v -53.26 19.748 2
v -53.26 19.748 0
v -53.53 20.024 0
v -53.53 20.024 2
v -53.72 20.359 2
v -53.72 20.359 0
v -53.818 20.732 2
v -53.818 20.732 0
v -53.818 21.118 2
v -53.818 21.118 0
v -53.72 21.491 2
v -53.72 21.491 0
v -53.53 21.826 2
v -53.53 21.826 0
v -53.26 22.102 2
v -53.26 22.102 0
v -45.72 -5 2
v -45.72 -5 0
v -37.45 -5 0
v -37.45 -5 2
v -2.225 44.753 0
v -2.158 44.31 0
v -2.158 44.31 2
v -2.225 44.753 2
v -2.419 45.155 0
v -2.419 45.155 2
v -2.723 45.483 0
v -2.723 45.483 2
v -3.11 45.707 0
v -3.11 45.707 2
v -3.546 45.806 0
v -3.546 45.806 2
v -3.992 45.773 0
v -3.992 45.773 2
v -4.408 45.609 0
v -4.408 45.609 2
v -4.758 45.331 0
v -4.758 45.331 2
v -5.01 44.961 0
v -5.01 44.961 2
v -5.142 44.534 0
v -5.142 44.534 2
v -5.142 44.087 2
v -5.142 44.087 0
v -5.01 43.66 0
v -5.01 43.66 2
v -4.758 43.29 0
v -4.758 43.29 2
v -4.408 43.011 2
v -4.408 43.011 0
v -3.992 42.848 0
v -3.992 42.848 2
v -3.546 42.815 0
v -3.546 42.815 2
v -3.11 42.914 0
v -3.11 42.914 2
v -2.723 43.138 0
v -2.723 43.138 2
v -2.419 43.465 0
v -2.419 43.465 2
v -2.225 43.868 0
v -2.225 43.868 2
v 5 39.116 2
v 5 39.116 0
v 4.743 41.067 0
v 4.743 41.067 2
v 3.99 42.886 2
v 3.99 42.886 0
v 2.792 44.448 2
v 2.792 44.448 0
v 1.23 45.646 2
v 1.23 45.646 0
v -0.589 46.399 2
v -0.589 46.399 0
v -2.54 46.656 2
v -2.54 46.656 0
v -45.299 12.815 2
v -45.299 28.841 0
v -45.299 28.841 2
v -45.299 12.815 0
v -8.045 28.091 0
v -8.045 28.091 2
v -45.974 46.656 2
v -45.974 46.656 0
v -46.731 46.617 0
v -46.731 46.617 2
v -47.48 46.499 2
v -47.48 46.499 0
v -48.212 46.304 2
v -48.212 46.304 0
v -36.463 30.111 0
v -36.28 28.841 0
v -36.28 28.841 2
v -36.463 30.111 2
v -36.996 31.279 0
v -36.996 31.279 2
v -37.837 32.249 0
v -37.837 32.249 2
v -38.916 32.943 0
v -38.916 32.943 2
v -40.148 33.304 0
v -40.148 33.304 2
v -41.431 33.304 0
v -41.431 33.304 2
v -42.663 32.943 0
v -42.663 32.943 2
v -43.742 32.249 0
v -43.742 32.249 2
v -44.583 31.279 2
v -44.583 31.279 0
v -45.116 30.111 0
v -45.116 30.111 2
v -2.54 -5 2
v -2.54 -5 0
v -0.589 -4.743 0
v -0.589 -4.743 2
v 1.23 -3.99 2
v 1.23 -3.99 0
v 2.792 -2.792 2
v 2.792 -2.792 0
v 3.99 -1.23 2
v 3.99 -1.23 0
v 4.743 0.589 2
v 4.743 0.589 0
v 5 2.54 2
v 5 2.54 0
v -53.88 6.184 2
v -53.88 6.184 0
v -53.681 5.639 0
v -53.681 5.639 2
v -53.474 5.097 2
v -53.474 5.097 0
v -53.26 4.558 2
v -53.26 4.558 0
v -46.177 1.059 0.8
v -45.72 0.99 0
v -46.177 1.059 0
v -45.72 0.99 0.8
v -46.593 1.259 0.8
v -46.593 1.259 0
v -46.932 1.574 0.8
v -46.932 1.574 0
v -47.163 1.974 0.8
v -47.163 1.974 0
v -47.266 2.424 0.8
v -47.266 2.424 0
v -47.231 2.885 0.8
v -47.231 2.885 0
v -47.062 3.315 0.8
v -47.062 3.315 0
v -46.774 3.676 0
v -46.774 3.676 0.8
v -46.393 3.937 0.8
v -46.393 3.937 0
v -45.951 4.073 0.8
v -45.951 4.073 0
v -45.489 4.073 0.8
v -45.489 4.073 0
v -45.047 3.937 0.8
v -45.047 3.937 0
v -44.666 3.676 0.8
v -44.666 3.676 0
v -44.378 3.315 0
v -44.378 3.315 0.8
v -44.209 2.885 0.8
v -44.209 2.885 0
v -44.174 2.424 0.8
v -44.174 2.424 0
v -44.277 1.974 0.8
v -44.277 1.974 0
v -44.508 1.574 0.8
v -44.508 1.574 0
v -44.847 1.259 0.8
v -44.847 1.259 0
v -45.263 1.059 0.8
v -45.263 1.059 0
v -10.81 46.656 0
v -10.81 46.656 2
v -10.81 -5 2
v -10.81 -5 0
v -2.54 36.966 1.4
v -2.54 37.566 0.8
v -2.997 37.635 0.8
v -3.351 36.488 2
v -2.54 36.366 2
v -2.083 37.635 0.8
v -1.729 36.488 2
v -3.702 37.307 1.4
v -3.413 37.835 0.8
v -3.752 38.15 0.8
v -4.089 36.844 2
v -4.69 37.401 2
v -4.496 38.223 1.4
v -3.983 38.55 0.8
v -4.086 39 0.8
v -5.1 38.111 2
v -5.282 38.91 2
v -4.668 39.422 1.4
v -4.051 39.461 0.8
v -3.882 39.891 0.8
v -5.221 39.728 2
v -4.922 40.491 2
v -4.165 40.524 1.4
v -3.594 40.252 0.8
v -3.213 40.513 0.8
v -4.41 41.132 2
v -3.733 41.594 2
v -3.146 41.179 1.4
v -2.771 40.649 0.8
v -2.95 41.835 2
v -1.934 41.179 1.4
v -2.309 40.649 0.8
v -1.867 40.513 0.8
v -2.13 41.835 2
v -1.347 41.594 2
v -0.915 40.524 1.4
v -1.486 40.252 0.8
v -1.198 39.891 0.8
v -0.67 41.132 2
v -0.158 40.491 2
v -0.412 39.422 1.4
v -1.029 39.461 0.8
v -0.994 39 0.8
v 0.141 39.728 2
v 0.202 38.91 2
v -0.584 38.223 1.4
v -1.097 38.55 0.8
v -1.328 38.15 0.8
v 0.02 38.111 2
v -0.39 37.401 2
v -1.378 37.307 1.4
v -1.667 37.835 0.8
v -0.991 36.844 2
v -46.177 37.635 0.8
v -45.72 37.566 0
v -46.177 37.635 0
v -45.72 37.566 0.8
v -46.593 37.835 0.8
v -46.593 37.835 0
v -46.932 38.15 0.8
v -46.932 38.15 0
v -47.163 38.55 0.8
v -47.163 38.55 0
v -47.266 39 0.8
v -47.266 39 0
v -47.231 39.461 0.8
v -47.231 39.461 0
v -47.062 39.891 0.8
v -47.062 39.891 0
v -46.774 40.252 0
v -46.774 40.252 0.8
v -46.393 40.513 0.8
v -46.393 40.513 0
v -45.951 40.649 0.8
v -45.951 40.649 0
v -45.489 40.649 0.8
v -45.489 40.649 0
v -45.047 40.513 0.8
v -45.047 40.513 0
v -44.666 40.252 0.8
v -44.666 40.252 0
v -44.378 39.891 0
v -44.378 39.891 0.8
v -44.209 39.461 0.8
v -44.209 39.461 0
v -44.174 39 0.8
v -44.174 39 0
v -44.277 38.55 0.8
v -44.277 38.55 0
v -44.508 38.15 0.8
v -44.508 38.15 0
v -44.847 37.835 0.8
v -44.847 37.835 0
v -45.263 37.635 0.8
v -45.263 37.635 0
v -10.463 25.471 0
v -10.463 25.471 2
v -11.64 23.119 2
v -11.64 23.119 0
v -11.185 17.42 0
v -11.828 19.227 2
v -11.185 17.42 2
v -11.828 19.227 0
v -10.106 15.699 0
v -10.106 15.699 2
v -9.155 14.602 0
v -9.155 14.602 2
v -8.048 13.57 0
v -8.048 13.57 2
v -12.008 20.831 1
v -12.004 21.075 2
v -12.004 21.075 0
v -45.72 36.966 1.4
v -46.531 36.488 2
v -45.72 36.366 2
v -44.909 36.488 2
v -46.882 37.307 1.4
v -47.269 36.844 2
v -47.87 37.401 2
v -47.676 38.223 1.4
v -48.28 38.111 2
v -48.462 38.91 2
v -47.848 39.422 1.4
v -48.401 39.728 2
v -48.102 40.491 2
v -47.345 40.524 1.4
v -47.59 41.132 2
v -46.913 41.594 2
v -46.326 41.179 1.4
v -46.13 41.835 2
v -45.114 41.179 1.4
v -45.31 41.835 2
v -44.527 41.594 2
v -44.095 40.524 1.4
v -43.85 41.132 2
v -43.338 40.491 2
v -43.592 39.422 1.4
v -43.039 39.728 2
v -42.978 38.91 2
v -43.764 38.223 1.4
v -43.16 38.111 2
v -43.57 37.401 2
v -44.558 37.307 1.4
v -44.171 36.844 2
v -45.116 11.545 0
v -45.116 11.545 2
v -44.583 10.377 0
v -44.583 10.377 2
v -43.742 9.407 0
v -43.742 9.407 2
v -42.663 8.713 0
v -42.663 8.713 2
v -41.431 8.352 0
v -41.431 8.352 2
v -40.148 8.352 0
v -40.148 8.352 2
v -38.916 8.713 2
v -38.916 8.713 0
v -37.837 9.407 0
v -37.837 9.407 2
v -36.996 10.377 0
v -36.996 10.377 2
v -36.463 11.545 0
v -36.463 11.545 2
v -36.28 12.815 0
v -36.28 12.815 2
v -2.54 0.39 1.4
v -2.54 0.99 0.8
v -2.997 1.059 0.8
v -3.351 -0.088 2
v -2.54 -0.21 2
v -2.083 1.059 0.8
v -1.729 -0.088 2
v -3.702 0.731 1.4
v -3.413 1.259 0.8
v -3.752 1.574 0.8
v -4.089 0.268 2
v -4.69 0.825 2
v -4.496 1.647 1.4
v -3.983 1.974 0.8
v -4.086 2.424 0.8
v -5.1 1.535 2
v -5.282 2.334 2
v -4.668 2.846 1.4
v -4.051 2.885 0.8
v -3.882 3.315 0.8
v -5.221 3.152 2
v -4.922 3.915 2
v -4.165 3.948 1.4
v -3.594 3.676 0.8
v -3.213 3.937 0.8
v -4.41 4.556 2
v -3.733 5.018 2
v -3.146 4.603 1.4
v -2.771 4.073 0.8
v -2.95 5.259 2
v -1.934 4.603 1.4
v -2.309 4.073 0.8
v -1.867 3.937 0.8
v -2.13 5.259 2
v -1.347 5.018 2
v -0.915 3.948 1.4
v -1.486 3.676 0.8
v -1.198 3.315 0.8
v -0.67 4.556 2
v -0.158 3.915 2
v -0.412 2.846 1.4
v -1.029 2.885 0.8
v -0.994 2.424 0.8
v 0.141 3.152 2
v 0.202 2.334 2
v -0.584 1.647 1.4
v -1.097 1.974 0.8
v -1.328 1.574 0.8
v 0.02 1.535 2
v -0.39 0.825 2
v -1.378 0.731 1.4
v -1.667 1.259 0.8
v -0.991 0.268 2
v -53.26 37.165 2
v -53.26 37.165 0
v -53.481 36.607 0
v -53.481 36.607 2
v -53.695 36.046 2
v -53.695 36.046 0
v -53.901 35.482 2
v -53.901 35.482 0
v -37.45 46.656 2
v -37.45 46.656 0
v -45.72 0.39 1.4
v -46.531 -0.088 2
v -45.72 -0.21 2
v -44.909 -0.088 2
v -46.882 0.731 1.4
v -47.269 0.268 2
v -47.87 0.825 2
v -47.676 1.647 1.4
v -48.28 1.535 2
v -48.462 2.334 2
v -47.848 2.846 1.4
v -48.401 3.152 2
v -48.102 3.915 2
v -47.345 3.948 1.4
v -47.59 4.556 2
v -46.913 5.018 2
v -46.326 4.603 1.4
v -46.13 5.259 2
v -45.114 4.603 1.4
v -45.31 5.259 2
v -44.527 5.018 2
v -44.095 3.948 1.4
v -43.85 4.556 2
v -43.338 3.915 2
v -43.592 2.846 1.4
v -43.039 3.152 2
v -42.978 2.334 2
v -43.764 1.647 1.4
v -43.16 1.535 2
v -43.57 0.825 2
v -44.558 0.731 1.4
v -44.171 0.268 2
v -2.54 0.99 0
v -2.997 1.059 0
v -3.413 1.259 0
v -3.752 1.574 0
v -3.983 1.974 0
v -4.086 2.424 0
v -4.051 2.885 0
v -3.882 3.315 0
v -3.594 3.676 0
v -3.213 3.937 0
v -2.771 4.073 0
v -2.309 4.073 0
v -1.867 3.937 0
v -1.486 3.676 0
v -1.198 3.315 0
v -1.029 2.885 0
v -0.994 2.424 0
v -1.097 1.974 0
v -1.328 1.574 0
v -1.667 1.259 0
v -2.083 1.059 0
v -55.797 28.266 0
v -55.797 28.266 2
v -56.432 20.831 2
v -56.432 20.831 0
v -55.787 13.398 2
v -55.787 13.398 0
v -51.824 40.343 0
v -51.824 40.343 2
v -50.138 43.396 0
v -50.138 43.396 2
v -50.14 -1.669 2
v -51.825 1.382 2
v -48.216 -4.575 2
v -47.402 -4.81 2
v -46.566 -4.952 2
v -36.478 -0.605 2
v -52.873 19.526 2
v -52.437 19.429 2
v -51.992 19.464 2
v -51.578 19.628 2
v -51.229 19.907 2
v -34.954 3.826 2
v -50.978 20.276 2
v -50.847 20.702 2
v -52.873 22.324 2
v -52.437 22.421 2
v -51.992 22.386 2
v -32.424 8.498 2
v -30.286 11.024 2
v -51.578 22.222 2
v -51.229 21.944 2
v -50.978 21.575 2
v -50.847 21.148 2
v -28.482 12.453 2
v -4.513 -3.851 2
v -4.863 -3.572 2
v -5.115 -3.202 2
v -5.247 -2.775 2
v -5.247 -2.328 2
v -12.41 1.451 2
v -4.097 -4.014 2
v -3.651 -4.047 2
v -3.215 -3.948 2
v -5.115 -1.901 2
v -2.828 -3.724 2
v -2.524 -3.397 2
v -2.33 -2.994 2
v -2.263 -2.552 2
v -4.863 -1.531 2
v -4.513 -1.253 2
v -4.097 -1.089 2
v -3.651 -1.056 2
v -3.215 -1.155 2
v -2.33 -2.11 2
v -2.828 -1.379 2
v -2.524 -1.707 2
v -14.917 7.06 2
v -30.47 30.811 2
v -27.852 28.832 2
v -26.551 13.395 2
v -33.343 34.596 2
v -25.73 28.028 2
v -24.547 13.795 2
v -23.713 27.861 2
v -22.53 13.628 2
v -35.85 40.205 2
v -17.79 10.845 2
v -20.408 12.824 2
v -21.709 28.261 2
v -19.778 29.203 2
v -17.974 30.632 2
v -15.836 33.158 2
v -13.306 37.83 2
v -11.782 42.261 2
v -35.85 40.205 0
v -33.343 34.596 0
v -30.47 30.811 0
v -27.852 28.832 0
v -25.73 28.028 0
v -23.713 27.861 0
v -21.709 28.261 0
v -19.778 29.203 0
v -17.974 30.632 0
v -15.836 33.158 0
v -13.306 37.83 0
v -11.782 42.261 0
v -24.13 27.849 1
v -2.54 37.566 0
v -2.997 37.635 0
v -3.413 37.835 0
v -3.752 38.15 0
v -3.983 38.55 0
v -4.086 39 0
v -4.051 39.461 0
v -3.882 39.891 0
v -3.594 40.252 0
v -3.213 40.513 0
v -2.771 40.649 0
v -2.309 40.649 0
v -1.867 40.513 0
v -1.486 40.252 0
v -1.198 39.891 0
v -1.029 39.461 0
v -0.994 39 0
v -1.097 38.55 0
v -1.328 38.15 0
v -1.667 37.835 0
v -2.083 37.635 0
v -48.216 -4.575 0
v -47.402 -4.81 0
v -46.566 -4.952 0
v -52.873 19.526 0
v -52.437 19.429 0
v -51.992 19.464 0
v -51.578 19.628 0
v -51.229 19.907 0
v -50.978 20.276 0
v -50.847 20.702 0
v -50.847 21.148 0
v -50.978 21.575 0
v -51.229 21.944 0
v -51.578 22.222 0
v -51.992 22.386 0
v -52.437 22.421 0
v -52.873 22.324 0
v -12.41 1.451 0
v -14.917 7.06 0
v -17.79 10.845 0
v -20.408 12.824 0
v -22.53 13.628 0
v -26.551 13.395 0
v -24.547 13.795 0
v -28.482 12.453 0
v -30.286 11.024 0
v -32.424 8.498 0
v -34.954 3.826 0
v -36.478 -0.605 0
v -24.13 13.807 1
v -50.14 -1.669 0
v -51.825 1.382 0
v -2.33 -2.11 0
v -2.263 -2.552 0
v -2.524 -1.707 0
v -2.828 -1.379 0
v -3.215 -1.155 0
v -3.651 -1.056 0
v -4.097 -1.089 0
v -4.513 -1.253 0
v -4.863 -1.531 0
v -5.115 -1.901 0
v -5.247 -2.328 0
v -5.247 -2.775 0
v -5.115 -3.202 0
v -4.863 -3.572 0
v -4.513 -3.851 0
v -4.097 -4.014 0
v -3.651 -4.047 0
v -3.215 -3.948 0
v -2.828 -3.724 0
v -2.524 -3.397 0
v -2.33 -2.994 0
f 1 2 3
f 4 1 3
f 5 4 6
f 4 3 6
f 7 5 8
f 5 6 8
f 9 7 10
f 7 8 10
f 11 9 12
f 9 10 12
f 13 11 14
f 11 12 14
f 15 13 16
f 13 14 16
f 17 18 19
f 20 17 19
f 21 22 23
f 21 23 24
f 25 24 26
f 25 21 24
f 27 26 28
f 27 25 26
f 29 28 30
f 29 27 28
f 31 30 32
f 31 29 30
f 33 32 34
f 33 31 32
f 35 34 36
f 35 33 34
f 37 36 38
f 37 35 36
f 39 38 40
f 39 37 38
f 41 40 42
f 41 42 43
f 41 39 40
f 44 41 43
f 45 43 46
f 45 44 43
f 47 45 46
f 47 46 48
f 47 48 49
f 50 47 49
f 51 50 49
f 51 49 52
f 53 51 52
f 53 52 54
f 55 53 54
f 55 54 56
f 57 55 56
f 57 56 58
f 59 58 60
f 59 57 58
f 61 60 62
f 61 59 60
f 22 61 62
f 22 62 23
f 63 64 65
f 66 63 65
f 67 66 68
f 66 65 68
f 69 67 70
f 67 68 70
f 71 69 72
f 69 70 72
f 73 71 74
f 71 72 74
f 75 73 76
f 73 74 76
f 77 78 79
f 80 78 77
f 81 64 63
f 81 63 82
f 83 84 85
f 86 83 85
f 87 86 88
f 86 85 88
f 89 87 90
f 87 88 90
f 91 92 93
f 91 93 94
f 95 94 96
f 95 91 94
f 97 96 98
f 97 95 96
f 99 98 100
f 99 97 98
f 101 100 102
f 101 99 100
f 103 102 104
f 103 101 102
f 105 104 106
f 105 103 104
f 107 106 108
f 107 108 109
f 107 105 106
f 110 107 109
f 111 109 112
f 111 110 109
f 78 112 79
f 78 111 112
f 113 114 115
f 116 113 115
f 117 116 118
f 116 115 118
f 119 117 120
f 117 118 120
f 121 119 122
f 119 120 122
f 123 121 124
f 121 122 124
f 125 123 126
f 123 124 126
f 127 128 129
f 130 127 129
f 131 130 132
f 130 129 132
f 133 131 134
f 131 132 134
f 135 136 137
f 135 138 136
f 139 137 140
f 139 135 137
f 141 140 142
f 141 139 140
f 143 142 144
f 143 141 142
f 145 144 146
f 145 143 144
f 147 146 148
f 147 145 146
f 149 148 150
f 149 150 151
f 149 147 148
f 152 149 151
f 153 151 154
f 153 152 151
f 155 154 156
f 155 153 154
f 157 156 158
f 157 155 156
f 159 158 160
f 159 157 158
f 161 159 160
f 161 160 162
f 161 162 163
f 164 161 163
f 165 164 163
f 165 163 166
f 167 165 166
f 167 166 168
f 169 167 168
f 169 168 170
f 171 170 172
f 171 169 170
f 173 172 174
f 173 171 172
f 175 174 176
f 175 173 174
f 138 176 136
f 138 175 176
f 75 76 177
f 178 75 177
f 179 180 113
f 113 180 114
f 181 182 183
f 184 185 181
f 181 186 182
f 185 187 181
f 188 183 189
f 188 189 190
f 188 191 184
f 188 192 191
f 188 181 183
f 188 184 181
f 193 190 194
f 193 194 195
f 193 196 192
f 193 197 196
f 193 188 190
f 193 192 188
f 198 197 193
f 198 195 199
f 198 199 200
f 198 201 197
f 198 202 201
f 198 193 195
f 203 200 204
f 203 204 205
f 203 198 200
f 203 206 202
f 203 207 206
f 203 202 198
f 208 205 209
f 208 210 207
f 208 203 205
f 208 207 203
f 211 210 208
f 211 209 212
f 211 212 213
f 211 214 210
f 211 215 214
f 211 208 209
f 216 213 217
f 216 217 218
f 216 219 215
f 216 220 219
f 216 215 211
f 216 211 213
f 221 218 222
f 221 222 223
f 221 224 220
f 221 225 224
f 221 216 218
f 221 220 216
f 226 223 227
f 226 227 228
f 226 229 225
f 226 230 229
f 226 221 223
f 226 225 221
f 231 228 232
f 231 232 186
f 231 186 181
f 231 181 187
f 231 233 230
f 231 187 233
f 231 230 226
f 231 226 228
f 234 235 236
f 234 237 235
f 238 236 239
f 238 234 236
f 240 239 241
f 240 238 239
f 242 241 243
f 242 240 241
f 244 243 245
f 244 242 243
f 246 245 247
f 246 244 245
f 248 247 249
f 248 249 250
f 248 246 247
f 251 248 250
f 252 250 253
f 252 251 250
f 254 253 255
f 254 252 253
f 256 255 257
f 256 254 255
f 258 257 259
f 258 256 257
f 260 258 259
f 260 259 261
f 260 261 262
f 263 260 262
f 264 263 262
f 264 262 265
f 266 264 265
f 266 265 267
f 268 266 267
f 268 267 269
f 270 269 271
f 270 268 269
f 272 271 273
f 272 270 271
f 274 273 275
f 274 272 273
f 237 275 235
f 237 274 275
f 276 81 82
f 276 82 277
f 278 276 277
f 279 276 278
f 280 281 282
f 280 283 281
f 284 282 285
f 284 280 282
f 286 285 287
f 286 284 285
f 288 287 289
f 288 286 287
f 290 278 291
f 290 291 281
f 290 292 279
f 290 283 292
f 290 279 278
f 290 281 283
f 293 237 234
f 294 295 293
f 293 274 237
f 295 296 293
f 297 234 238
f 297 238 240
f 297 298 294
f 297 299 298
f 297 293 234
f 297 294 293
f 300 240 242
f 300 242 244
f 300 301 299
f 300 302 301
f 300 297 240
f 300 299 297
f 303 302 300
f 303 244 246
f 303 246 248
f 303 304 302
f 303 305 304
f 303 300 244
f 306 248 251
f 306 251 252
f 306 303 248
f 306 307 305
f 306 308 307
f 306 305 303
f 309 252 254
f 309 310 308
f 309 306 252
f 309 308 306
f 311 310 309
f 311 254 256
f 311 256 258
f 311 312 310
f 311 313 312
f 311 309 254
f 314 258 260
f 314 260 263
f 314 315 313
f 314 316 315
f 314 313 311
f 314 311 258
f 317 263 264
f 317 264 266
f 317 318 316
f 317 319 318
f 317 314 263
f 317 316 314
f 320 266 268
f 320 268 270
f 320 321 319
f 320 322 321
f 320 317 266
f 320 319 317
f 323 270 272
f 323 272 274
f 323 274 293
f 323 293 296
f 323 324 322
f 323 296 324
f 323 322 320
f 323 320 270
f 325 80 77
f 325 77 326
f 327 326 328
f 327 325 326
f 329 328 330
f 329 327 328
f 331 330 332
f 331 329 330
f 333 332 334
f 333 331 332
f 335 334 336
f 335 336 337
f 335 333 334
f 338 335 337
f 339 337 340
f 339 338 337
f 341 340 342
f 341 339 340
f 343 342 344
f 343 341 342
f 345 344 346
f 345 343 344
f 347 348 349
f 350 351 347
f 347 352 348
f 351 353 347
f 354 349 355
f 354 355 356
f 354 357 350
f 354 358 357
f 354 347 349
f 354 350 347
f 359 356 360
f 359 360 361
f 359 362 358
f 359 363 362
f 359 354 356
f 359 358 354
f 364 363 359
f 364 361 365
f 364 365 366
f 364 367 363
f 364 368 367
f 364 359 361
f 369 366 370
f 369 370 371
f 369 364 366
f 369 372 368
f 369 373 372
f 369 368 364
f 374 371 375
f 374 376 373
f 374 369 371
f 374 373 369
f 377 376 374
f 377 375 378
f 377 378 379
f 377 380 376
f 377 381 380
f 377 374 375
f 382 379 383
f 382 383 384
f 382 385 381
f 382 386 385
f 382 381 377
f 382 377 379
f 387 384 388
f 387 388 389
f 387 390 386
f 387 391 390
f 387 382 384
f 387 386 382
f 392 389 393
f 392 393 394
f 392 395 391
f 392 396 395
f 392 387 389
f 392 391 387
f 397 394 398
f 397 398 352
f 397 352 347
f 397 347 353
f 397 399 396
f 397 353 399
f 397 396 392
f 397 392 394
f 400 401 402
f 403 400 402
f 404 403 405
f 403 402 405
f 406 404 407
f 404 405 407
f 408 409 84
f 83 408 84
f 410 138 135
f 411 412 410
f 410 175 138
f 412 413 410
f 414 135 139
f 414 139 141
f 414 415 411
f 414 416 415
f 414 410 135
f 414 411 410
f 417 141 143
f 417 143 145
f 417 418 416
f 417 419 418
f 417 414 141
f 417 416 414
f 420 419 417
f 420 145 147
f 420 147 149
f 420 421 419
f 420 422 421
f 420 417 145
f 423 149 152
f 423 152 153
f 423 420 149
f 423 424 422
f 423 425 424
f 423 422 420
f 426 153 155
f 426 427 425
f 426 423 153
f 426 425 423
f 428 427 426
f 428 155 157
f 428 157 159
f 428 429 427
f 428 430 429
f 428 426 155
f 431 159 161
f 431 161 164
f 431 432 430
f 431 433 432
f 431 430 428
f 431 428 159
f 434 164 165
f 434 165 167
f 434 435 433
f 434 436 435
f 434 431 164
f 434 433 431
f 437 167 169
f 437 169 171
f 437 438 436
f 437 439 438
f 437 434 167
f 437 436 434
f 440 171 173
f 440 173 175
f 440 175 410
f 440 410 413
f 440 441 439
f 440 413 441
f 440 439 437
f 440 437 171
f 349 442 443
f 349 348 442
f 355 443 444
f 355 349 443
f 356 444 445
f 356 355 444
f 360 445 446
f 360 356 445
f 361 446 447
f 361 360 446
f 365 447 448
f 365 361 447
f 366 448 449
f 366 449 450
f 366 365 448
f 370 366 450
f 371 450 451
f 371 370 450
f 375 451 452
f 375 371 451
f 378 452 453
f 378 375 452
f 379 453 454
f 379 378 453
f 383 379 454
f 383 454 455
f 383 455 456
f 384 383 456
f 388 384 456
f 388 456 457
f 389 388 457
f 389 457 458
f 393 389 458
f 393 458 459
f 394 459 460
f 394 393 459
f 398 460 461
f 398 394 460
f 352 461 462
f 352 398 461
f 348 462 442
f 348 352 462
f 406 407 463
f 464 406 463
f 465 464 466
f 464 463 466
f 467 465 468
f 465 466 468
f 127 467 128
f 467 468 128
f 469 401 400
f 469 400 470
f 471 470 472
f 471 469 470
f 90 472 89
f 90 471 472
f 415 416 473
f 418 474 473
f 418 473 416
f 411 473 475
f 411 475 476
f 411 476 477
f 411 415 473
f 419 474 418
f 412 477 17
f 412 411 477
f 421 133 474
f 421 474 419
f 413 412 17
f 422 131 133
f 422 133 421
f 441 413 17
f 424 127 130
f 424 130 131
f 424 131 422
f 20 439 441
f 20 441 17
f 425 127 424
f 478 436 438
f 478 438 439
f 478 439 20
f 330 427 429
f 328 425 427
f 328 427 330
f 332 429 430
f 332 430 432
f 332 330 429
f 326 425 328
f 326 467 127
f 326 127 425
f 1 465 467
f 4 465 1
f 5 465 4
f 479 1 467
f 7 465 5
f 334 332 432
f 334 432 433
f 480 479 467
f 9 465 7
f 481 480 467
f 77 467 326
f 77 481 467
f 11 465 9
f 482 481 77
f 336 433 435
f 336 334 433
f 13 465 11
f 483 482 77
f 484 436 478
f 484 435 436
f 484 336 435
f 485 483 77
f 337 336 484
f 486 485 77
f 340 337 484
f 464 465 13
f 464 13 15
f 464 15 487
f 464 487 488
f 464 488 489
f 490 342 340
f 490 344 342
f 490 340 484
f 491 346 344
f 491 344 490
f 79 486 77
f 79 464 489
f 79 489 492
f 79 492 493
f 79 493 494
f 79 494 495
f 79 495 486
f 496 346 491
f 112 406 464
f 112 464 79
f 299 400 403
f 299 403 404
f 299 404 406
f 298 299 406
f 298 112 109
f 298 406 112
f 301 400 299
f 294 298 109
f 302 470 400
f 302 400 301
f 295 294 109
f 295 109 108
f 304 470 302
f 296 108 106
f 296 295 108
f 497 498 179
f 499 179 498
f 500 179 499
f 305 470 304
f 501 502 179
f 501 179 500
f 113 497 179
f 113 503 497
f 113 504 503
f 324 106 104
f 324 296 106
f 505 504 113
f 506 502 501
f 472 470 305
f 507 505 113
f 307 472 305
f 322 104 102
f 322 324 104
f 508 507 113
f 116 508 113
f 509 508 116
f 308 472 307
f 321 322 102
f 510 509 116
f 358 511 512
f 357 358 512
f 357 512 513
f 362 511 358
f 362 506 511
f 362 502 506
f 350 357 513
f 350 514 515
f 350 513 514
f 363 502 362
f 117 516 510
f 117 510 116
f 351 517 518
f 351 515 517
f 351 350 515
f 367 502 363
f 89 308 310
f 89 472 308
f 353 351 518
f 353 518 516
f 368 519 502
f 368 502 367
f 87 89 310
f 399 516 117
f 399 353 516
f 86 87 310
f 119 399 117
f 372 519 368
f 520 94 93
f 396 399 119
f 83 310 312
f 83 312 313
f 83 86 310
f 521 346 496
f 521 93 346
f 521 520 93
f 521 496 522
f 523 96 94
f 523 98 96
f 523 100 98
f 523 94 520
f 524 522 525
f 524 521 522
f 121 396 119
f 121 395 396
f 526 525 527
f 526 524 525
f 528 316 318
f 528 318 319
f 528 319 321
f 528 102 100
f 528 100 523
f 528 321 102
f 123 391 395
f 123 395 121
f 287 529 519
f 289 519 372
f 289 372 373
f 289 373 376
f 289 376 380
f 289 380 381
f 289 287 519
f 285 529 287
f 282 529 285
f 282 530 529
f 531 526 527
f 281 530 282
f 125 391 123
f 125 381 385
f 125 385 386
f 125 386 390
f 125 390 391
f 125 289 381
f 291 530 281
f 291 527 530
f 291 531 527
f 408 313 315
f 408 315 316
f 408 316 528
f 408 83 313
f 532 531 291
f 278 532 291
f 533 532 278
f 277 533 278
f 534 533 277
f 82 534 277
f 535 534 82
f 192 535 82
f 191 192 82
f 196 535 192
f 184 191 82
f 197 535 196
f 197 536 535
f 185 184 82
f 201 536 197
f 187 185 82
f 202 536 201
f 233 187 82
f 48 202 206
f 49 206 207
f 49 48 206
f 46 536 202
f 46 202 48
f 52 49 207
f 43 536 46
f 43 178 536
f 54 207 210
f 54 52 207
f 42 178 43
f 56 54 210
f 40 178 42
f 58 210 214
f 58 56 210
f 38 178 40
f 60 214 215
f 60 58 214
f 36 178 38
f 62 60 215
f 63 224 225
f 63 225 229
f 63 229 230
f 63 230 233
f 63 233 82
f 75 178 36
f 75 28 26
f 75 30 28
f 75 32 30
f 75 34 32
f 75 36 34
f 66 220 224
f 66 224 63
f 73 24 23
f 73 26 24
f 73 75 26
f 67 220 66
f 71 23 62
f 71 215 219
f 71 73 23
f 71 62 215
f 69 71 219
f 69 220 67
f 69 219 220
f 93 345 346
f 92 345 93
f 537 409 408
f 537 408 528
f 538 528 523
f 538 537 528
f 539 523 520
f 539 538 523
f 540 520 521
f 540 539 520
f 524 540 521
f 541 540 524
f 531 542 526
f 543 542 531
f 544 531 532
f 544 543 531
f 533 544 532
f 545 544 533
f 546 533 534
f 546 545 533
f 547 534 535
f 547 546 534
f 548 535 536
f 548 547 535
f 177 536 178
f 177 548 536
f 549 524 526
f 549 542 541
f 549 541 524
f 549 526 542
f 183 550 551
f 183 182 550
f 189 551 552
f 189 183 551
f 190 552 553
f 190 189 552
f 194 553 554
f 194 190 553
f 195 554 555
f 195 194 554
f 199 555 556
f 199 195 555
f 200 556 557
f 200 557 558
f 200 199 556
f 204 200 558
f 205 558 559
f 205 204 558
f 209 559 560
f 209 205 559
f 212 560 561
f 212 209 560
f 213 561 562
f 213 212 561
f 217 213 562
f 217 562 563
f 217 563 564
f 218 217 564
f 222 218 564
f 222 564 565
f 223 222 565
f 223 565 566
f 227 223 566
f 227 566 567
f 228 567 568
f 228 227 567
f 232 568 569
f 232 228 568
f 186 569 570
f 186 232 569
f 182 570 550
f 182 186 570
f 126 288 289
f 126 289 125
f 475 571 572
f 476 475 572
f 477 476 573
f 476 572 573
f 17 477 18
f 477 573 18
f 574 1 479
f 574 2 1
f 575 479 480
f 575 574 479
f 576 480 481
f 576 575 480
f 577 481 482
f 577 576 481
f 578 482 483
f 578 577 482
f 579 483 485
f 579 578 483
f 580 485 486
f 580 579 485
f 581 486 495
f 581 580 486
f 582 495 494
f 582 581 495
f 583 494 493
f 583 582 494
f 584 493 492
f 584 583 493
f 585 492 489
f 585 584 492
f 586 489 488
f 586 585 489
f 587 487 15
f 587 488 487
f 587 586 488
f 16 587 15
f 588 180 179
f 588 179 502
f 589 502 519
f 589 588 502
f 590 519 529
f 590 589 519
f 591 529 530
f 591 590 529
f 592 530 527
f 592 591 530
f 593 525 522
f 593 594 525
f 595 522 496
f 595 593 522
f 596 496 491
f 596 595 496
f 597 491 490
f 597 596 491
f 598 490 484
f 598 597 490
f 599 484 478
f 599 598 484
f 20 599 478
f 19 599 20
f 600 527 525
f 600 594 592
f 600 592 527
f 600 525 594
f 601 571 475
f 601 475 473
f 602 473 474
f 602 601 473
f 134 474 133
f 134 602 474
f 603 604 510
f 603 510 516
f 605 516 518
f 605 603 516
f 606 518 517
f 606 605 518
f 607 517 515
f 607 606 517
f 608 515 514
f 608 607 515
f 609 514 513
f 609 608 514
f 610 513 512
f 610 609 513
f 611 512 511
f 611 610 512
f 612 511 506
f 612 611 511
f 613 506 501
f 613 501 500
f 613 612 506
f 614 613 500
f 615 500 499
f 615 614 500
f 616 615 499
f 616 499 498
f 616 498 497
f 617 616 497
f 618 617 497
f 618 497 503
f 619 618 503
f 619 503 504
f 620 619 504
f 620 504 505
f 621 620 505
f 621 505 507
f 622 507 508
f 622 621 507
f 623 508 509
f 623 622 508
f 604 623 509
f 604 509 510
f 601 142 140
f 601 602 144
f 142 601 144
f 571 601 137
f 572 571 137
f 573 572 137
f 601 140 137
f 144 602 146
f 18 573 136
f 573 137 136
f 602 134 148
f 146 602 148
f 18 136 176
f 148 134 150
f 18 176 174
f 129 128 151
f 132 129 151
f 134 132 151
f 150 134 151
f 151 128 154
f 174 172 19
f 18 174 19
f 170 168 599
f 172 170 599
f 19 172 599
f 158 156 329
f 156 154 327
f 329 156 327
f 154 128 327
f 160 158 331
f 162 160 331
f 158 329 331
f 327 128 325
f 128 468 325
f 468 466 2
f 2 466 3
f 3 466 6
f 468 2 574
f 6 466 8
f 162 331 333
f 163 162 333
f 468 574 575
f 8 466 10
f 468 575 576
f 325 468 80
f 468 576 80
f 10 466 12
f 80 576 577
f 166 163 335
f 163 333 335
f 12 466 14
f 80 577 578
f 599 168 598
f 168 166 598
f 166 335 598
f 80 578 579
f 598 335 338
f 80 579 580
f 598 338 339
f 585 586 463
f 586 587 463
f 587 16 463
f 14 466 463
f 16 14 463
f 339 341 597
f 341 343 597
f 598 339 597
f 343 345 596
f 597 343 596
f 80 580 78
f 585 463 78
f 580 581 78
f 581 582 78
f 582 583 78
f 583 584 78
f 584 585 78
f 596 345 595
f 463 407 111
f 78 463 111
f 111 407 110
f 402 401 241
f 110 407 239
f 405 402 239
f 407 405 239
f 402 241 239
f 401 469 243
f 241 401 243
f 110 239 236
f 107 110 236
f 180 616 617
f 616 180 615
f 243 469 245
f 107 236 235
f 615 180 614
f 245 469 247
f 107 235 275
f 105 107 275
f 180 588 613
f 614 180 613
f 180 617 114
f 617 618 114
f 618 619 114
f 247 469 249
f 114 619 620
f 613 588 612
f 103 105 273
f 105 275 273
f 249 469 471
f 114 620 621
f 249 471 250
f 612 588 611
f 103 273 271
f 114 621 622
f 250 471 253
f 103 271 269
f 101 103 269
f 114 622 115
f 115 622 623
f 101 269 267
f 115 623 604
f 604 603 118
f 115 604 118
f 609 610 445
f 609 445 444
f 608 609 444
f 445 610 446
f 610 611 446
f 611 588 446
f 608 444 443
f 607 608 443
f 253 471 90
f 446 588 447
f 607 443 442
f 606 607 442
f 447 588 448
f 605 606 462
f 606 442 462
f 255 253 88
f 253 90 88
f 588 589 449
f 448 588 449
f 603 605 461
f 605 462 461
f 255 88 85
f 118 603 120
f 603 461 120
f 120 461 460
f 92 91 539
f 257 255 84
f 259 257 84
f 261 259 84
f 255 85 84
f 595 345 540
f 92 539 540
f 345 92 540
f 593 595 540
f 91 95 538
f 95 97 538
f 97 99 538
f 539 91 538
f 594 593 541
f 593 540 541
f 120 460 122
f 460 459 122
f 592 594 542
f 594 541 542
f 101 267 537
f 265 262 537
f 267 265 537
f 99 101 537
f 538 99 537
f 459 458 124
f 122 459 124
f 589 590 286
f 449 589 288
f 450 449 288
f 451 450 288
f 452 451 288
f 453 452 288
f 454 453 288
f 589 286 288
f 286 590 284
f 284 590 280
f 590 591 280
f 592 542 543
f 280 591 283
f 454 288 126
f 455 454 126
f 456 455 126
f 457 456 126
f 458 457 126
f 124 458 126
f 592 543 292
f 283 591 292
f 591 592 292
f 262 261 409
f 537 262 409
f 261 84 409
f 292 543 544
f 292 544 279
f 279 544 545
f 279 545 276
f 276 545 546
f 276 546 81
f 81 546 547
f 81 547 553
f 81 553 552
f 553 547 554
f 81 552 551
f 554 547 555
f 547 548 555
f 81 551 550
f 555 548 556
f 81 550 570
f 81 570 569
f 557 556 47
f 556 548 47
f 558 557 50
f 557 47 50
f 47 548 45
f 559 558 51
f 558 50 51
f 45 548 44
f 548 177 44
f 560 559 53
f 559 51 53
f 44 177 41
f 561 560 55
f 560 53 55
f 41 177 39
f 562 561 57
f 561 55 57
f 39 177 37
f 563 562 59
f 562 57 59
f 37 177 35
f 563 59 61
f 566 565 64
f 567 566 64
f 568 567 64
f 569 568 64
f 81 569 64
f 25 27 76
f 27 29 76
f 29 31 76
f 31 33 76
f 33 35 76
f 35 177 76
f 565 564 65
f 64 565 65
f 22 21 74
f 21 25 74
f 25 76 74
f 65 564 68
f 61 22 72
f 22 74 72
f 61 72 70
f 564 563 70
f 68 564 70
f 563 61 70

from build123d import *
from build123d.topology import SkipClean

# Parameters (mm, degrees)
BOSS_EXTRU_1_DEPTH                         = 2
FRAISAGE_POUR_VIS_T_TE_FRAIS_E_BOM_2_COUNT = 2
FRAISAGE_POUR_VIS_T_TE_FRAIS_E_BOM_2_PITCH = 36.576
FRAISAGE_POUR_VIS_T_TE_FRAIS_E_BOM_3_COUNT = 2
FRAISAGE_POUR_VIS_T_TE_FRAIS_E_BOM_3_PITCH = 56.589011089
FRAISAGE_POUR_VIS_T_TE_FRAIS_E_BOM_4_COUNT = 2
FRAISAGE_POUR_VIS_T_TE_FRAIS_E_BOM_4_PITCH = 43.18
ESQUISSE15_R                               = 1.5
ENL_V_MAT_EXTRU_5_DEPTH                    = 2
BOSS_EXTRU_3_DEPTH                         = 2
ENL_V_MAT_EXTRU_4_DEPTH                    = 2


with BuildPart() as part:
    # Esquisse1 → Boss.-Extru.1 (new body)
    with BuildSketch(Plane.XY):
        with BuildLine():
            Line((5, 2.54), (5, 39.116))
            ThreePointArc((5, 39.116), (2.79158513, 44.44758513), (-2.54, 46.656))
            Line((-2.54, 46.656), (-45.974, 46.656))
            ThreePointArc((-45.974, 46.656), (-51.125980008, 44.521980008), (-53.26, 39.37))
            Line((-53.26, 39.37), (-53.26, 2.54))
            ThreePointArc((-53.26, 2.54), (-51.05158513, -2.79158513), (-45.72, -5))
            Line((-45.72, -5), (-2.54, -5))
            ThreePointArc((-2.54, -5), (2.79158513, -2.79158513), (5, 2.54))
        make_face()
    extrude(amount=BOSS_EXTRU_1_DEPTH)

    # Esquisse16 → Fraisage pour vis à tête fraisée bombée M2.51 (revolve, cut)
    with BuildSketch(Plane(origin=(-2.54, 2.54, 2), x_dir=(0, -1, 0), z_dir=(1, 0, 0))):
        Polygon((0, 0), (0, 2), (1.55, 2), (1.55, 1.2), (2.75, 0), align=None)
    fraisage_pour_vis_t_te_frais_e_bomb_e = revolve(axis=Axis((-2.54, 2.54, 8.35), (0, 0, -1)), mode=Mode.SUBTRACT)

    # Fraisage pour vis _ t_te frais_e bom 2: Fraisage pour vis à tête fraisée bombée M2.51 ×2
    with Locations(*[(0, i * FRAISAGE_POUR_VIS_T_TE_FRAIS_E_BOM_2_PITCH, 0) for i in range(1, FRAISAGE_POUR_VIS_T_TE_FRAIS_E_BOM_2_COUNT)]):
        add(fraisage_pour_vis_t_te_frais_e_bomb_e, mode=Mode.SUBTRACT)

    # Fraisage pour vis _ t_te frais_e bom 3: Fraisage pour vis à tête fraisée bombée M2.51 ×2
    with Locations(*[Vector(-0.7630456721058034, 0.6463445693131512, 0) * (i * FRAISAGE_POUR_VIS_T_TE_FRAIS_E_BOM_3_PITCH) for i in range(1, FRAISAGE_POUR_VIS_T_TE_FRAIS_E_BOM_3_COUNT)]):
        add(fraisage_pour_vis_t_te_frais_e_bomb_e, mode=Mode.SUBTRACT)

    # Fraisage pour vis _ t_te frais_e bom 4: Fraisage pour vis à tête fraisée bombée M2.51 ×2
    with Locations(*[(-i * FRAISAGE_POUR_VIS_T_TE_FRAIS_E_BOM_4_PITCH, 0, 0) for i in range(1, FRAISAGE_POUR_VIS_T_TE_FRAIS_E_BOM_4_COUNT)]):
        add(fraisage_pour_vis_t_te_frais_e_bomb_e, mode=Mode.SUBTRACT)

    # Esquisse15 → Enlèv. mat.-Extru.5 (cut)
    with BuildSketch(Plane.XY):
        with Locations((-3.658386169, 44.310446006)):
            Circle(ESQUISSE15_R)
        with Locations((-52.330547462, 20.925047052)):
            Circle(ESQUISSE15_R)
        with Locations((-3.763486561, -2.551663742)):
            Circle(ESQUISSE15_R)
    extrude(amount=ENL_V_MAT_EXTRU_5_DEPTH, mode=Mode.SUBTRACT)

    # Esquisse14 → Boss.-Extru.3 (add)
    with BuildSketch(Plane.XY):
        with BuildLine():
            Line((-53.26, 22.10238217), (-53.26, 37.165169918))
            ThreePointArc((-53.26, 37.165169918), (-53.588975101, 36.32688135), (-53.900520078, 35.481960013))
            ThreePointArc((-53.900520078, 35.481960013), (-56.432053148, 20.831365998), (-53.880132923, 6.184309371))
            ThreePointArc((-53.880132923, 6.184309371), (-53.578203562, 5.368091645), (-53.26, 4.558079787))
            Line((-53.26, 4.558079787), (-53.26, 19.747711934))
            ThreePointArc((-53.26, 19.747711934), (-53.830547462, 20.925047052), (-53.26, 22.10238217))
        make_face()
    extrude(amount=BOSS_EXTRU_3_DEPTH)

    # Esquisse14<5> → Enlèv. mat.-Extru.4 (cut)
    with SkipClean():  # the faces are left unmerged after this step: merging them gives an invalid solid
        with BuildSketch(Plane.XY):
            with BuildLine():
                ThreePointArc((-53.26, 37.165169918), (-51.011337475, 41.886482774), (-48.212169147, 46.303714363))
                ThreePointArc((-48.212169147, 46.303714363), (-51.69919041, 43.876438812), (-53.239451379, 39.916820138))
                Line((-53.239451379, 39.916820138), (-53.900520078, 35.481960013))
                ThreePointArc((-53.900520078, 35.481960013), (-53.588975101, 36.32688135), (-53.26, 37.165169918))
            make_face()
            with BuildLine():
                add(Edge.make_bspline(
                    [(-37.449667929, 46.656), (-24.13, -31.756310028), (-10.810332071, 46.656)],
                    knots=[5.033406034, 5.033406034, 5.033406034, 7.53296458, 7.53296458, 7.53296458], degree=2, weights=[1, 0.315531822, 1]))
                Line((-10.810332071, 46.656), (-37.449667929, 46.656))
            make_face()
            with BuildLine():
                Line((-37.449667929, -5), (-10.810332071, -5))
                add(Edge.make_bspline(
                    [(-10.810332071, -5), (-24.13, 73.412310028), (-37.449667929, -5)],
                    knots=[5.033406034, 5.033406034, 5.033406034, 7.53296458, 7.53296458, 7.53296458], degree=2, weights=[1, 0.315531822, 1]))
            make_face()
            with BuildLine():
                ThreePointArc((-53.210302169, 1.675723757), (-51.610678888, -2.166538244), (-48.2162601, -4.574793427))
                ThreePointArc((-48.2162601, -4.574793427), (-51.013027883, -0.160172479), (-53.26, 4.558079787))
                ThreePointArc((-53.26, 4.558079787), (-53.578203562, 5.368091645), (-53.880132923, 6.184309371))
                Line((-53.880132923, 6.184309371), (-53.210302169, 1.675723757))
            make_face()
            with BuildLine():
                Line((-36.280356092, 12.815116729), (-36.280356092, 28.840883271))
                ThreePointArc((-36.280356092, 28.840883271), (-40.789570049, 33.350097228), (-45.298784007, 28.840883271))
                Line((-45.298784007, 28.840883271), (-45.298784007, 12.815116729))
                ThreePointArc((-45.298784007, 12.815116729), (-40.789570049, 8.305902772), (-36.280356092, 12.815116729))
            make_face()
            with BuildLine():
                Line((5, 39.116), (-8.045410448, 28.091494556))
                add(Edge.make_bspline(
                    [(-8.045410448, 28.091494556), (-16.636453297, 20.831316808), (-8.047692631, 13.570434437)],
                    knots=[5.739468015, 5.739468015, 5.739468015, 6.826742025, 6.826742025, 6.826742025], degree=2, weights=[1, 0.855833098, 1]))
                Line((-8.047692631, 13.570434437), (5, 2.54))
                Line((5, 2.54), (5, 39.116))
            make_face()
        extrude(amount=ENL_V_MAT_EXTRU_4_DEPTH, mode=Mode.SUBTRACT)


solid = part.part
